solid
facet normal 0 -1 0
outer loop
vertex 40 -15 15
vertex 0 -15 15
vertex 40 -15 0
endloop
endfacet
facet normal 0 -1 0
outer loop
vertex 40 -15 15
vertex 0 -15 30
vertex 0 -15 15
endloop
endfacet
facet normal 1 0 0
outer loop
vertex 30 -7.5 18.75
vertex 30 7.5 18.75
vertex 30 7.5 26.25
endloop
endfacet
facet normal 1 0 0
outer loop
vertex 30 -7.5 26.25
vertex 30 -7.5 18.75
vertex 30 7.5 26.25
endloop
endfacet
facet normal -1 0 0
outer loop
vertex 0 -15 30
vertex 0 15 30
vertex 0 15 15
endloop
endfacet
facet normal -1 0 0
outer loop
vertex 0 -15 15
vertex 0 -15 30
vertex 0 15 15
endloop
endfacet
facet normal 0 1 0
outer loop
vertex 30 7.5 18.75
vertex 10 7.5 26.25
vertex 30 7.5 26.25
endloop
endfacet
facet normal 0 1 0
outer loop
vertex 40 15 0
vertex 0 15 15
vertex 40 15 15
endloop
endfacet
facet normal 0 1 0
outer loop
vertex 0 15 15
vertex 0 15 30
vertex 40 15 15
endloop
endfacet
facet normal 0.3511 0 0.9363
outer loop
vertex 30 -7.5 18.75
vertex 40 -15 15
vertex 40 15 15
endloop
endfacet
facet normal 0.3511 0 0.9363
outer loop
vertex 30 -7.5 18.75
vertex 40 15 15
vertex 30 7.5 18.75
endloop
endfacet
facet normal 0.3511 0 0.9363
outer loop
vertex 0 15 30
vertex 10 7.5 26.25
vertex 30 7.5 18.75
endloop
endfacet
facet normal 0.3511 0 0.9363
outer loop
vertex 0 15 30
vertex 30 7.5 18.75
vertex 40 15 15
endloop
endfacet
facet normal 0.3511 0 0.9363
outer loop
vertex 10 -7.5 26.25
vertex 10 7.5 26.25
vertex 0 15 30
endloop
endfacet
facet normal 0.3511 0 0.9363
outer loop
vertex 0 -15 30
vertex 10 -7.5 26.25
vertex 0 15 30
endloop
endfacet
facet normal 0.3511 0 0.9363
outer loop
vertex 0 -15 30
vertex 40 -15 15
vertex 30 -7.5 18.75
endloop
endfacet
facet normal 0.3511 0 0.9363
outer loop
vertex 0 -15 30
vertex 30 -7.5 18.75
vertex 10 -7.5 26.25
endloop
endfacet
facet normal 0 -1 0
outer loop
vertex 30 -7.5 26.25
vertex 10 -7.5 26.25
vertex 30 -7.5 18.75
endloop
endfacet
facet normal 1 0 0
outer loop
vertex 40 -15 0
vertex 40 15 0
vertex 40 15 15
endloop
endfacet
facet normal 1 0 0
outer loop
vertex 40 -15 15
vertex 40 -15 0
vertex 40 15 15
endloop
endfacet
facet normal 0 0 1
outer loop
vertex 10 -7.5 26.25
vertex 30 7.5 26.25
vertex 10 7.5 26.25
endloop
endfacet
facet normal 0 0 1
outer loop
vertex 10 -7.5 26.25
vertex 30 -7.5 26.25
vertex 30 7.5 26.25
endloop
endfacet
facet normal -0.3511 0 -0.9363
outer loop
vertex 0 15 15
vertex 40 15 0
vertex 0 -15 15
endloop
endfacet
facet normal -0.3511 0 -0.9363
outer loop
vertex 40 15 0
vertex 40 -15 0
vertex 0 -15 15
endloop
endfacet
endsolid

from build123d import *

# Parameters (mm, degrees)
F1_DEPTH = 15
F2_DEPTH = 7.5
F3_DEPTH = 15


with BuildPart() as f1:
    # F0 (on Front) → F1 (new body, symmetric)
    with BuildSketch(Plane.XZ):
        Polygon((0, 15), (0, 0), (40, 0), align=None)
        Polygon((10, 18.75), (30, 18.75), (10, 26.25), align=None)
        Polygon((0, 15), (40, 0), (40, 15), (30, 18.75), (10, 18.75), (10, 26.25), (0, 30), align=None)
    extrude(amount=F1_DEPTH, both=True)

    # F0 (on Front) → F2 (join, symmetric)
    with BuildSketch(Plane.XZ):
        Polygon((10, 26.25), (30, 18.75), (30, 26.25), align=None)
    extrude(amount=F2_DEPTH, both=True)

    # F0 (on Front) → F3 (cut, symmetric)
    with BuildSketch(Plane.XZ):
        Polygon((0, 15), (0, 0), (40, 0), align=None)
    extrude(amount=F3_DEPTH, both=True, mode=Mode.SUBTRACT)


solid = f1.part
